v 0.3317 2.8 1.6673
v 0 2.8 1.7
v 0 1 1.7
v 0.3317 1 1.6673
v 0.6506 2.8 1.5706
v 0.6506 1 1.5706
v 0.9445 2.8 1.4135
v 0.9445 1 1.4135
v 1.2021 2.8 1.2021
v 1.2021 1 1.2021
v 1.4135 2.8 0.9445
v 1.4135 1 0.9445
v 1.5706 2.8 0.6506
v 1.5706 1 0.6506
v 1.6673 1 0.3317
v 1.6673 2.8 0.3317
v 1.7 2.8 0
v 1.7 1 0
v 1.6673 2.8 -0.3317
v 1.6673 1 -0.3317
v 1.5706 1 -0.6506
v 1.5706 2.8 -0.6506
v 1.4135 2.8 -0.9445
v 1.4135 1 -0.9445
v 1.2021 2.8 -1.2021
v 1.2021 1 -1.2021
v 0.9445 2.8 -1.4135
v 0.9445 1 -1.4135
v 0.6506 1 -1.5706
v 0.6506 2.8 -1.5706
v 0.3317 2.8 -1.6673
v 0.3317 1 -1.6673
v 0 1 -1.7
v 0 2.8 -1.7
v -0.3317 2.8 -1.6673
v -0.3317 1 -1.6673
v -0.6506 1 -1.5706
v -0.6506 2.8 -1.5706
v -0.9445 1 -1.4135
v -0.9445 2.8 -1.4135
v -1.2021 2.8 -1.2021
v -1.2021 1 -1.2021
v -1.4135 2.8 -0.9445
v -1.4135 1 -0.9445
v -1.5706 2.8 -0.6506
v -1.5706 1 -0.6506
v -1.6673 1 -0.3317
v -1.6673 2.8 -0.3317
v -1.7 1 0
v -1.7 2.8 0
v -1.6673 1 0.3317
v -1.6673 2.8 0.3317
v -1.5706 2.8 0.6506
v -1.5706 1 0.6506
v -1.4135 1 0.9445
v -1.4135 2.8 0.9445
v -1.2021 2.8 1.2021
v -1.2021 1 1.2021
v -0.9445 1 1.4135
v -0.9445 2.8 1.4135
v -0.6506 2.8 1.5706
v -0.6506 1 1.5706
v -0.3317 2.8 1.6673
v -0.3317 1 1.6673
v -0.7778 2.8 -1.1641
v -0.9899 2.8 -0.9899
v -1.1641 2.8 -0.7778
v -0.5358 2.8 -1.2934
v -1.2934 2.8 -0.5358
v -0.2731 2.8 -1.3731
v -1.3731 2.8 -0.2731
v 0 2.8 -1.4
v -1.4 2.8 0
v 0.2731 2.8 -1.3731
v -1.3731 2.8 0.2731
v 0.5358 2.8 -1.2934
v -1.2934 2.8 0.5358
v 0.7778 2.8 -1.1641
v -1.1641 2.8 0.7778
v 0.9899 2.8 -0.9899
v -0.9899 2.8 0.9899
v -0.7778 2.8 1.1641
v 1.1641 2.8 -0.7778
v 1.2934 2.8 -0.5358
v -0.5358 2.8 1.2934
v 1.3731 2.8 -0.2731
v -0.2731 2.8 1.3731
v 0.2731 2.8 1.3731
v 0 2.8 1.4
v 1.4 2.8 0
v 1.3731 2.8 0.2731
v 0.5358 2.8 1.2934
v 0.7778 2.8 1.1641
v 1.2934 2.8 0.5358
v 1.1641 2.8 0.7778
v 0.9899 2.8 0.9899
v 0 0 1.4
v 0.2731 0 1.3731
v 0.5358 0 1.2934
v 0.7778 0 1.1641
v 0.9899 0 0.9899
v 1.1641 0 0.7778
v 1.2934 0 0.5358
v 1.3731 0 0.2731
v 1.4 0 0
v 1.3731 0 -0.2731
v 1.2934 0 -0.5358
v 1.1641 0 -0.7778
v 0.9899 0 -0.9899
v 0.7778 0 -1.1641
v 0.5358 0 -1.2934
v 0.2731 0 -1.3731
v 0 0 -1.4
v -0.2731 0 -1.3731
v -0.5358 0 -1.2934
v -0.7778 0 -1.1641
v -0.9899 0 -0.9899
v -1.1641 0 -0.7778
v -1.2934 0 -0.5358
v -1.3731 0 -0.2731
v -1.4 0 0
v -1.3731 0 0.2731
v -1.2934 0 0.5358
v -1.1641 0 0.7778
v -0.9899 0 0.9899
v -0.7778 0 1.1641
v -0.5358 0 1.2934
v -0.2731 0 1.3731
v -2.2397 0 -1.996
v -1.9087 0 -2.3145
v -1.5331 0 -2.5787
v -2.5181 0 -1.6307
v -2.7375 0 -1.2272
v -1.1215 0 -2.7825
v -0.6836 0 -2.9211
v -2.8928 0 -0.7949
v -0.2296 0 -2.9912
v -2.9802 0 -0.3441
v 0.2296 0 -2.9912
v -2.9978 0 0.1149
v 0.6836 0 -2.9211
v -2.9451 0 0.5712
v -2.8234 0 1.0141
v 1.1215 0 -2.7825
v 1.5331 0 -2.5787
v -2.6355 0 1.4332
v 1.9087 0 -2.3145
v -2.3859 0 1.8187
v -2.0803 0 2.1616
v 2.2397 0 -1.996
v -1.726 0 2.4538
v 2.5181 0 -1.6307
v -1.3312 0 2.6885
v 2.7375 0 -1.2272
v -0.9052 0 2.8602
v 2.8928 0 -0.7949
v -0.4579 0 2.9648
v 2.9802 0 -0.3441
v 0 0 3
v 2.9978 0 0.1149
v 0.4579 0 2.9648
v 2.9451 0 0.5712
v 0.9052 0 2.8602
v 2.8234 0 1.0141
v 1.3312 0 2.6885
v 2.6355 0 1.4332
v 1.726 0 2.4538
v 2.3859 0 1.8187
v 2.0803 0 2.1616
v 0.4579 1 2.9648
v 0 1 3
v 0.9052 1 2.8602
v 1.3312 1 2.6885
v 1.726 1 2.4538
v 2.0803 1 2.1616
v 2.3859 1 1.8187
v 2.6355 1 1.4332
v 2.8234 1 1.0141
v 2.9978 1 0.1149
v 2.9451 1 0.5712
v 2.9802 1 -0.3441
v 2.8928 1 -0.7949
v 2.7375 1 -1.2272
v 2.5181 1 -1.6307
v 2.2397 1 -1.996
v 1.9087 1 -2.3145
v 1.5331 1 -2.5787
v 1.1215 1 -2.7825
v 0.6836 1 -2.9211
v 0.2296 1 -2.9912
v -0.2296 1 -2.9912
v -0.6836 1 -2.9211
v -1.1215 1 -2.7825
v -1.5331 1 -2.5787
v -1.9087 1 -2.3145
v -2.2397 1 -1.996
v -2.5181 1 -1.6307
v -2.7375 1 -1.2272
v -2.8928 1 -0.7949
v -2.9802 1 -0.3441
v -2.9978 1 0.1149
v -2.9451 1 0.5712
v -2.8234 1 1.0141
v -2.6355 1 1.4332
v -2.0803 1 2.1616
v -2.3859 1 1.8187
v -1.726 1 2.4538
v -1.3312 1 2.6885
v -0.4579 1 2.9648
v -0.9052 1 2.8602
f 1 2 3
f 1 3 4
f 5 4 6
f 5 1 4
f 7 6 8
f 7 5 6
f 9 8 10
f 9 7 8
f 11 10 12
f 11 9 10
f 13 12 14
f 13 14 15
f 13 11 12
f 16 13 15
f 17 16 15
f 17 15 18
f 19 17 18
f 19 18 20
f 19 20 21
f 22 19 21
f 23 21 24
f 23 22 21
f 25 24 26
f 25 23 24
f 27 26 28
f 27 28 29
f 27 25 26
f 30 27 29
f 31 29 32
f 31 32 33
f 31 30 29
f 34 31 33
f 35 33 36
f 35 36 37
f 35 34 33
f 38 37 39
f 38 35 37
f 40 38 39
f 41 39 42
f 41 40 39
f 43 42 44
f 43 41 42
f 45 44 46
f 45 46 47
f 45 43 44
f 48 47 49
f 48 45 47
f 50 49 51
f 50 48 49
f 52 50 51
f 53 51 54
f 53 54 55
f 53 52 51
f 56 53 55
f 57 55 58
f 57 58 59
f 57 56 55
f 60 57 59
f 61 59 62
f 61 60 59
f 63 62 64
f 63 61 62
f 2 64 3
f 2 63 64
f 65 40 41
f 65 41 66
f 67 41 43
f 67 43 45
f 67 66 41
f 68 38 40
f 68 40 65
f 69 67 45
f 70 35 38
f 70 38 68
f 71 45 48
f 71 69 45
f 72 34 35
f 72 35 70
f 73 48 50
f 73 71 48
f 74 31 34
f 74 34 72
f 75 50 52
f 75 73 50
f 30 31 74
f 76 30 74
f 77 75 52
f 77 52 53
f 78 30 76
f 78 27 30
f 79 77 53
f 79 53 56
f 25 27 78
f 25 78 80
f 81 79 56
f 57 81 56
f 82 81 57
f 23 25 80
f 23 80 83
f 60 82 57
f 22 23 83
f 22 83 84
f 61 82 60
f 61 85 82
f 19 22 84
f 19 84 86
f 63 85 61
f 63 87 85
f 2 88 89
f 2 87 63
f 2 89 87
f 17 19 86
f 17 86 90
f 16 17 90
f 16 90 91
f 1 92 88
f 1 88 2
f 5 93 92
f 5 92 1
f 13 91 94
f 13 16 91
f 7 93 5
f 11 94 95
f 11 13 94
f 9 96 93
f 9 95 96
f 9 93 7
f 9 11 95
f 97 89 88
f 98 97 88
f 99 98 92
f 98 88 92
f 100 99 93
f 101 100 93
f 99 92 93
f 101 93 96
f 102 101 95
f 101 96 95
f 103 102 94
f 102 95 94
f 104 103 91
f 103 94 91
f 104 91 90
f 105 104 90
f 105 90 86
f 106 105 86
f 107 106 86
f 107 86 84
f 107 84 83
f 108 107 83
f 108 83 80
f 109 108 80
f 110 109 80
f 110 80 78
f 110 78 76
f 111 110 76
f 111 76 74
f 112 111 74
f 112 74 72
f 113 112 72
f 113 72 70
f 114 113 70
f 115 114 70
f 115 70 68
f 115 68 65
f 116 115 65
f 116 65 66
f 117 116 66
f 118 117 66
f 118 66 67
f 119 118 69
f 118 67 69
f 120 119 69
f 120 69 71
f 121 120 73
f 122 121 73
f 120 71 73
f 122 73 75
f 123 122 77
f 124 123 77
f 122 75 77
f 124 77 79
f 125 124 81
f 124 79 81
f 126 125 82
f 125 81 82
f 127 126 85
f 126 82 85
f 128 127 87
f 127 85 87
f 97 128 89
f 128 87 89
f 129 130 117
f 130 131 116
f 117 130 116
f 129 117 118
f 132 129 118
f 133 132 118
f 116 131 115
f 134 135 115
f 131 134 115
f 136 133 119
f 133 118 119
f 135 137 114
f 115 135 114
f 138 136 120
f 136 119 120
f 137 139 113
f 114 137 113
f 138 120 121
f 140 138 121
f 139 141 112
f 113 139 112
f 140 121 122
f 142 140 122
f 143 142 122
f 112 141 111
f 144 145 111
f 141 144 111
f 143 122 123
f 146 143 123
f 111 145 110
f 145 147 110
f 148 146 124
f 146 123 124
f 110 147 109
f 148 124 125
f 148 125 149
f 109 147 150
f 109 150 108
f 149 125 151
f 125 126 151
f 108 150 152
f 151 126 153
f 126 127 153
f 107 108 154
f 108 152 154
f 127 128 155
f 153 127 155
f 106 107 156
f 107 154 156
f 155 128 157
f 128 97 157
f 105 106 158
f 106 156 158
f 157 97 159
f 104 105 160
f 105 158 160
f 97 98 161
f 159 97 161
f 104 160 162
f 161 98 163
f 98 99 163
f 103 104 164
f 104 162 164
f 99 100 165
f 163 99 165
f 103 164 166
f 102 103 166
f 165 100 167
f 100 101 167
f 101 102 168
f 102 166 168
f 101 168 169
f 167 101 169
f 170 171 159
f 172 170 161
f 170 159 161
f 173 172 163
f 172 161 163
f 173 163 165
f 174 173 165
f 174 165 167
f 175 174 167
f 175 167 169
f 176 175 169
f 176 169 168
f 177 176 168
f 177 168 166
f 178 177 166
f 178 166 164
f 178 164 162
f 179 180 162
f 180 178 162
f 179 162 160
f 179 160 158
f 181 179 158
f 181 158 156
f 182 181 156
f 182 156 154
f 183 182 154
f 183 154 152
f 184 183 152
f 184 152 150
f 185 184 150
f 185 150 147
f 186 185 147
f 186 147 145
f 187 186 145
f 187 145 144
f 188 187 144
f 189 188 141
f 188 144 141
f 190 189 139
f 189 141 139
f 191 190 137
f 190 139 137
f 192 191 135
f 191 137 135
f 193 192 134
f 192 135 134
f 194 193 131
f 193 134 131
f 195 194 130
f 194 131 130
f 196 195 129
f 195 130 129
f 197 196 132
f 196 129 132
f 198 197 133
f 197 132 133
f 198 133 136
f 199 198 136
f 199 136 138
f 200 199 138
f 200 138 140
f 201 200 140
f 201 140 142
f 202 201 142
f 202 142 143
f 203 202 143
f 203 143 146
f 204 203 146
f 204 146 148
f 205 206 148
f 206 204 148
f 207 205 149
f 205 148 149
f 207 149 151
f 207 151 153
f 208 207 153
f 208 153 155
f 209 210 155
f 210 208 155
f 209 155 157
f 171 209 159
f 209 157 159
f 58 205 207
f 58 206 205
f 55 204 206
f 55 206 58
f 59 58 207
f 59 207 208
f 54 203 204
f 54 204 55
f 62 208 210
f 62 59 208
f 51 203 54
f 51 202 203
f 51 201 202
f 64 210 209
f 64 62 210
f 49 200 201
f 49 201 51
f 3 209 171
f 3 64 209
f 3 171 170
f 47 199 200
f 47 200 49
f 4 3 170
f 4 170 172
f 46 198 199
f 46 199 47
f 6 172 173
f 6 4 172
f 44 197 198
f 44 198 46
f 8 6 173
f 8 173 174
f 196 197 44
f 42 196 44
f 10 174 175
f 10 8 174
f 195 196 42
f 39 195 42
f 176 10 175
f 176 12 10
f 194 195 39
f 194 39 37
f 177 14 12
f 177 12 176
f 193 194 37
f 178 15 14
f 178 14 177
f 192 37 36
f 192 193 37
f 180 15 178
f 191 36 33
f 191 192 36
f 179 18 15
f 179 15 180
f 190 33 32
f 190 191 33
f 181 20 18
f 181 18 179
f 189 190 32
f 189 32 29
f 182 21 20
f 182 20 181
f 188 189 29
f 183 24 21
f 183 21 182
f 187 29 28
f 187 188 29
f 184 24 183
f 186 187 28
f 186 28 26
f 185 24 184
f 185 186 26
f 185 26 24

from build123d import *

# Parameters (mm, degrees)
SKETCH_1_R          = 3
EXTRUDE_1_DEPTH     = 2.8
SKETCH_2_R          = 1.4
CUT_EXTRUDE_1_DEPTH = 6.083306011
SKETCH_3_OUTSIDE_W  = 9.788
SKETCH_3_OUTSIDE_H  = 9.788
SKETCH_3_OUTSIDE_R  = 1.7
CUT_EXTRUDE_2_DEPTH = 1.8


with BuildPart() as part:
    # 草图1 → 拉伸1 (new body)
    with BuildSketch(Plane(origin=(0, 0, 0), x_dir=(1, 0, 0), z_dir=(0, 1, 0))):
        with Locations(Location((0, 0, 0), (0, 0, 270))):
            Circle(SKETCH_1_R)
    extrude(amount=EXTRUDE_1_DEPTH)

    # 草图2 → 切除-拉伸1 (cut, through all)
    with BuildSketch(Plane(origin=(0, 2.8, 0), x_dir=(-1, 0, 0), z_dir=(0, 1, 0))):
        with Locations(Location((0, 0, 0), (0, 0, 90))):
            Circle(SKETCH_2_R)
    extrude(amount=-CUT_EXTRUDE_1_DEPTH, mode=Mode.SUBTRACT)

    # 草图3 outside → 切除-拉伸2 (cut)
    with BuildSketch(Plane(origin=(0, 2.8, 0), x_dir=(1, 0, 0), z_dir=(0, 1, 0))):
        Rectangle(SKETCH_3_OUTSIDE_W, SKETCH_3_OUTSIDE_H)
        with Locations(Location((0, 0, 0), (0, 0, 270))):
            Circle(SKETCH_3_OUTSIDE_R, mode=Mode.SUBTRACT)
    extrude(amount=-CUT_EXTRUDE_2_DEPTH, mode=Mode.SUBTRACT)


solid = part.part
